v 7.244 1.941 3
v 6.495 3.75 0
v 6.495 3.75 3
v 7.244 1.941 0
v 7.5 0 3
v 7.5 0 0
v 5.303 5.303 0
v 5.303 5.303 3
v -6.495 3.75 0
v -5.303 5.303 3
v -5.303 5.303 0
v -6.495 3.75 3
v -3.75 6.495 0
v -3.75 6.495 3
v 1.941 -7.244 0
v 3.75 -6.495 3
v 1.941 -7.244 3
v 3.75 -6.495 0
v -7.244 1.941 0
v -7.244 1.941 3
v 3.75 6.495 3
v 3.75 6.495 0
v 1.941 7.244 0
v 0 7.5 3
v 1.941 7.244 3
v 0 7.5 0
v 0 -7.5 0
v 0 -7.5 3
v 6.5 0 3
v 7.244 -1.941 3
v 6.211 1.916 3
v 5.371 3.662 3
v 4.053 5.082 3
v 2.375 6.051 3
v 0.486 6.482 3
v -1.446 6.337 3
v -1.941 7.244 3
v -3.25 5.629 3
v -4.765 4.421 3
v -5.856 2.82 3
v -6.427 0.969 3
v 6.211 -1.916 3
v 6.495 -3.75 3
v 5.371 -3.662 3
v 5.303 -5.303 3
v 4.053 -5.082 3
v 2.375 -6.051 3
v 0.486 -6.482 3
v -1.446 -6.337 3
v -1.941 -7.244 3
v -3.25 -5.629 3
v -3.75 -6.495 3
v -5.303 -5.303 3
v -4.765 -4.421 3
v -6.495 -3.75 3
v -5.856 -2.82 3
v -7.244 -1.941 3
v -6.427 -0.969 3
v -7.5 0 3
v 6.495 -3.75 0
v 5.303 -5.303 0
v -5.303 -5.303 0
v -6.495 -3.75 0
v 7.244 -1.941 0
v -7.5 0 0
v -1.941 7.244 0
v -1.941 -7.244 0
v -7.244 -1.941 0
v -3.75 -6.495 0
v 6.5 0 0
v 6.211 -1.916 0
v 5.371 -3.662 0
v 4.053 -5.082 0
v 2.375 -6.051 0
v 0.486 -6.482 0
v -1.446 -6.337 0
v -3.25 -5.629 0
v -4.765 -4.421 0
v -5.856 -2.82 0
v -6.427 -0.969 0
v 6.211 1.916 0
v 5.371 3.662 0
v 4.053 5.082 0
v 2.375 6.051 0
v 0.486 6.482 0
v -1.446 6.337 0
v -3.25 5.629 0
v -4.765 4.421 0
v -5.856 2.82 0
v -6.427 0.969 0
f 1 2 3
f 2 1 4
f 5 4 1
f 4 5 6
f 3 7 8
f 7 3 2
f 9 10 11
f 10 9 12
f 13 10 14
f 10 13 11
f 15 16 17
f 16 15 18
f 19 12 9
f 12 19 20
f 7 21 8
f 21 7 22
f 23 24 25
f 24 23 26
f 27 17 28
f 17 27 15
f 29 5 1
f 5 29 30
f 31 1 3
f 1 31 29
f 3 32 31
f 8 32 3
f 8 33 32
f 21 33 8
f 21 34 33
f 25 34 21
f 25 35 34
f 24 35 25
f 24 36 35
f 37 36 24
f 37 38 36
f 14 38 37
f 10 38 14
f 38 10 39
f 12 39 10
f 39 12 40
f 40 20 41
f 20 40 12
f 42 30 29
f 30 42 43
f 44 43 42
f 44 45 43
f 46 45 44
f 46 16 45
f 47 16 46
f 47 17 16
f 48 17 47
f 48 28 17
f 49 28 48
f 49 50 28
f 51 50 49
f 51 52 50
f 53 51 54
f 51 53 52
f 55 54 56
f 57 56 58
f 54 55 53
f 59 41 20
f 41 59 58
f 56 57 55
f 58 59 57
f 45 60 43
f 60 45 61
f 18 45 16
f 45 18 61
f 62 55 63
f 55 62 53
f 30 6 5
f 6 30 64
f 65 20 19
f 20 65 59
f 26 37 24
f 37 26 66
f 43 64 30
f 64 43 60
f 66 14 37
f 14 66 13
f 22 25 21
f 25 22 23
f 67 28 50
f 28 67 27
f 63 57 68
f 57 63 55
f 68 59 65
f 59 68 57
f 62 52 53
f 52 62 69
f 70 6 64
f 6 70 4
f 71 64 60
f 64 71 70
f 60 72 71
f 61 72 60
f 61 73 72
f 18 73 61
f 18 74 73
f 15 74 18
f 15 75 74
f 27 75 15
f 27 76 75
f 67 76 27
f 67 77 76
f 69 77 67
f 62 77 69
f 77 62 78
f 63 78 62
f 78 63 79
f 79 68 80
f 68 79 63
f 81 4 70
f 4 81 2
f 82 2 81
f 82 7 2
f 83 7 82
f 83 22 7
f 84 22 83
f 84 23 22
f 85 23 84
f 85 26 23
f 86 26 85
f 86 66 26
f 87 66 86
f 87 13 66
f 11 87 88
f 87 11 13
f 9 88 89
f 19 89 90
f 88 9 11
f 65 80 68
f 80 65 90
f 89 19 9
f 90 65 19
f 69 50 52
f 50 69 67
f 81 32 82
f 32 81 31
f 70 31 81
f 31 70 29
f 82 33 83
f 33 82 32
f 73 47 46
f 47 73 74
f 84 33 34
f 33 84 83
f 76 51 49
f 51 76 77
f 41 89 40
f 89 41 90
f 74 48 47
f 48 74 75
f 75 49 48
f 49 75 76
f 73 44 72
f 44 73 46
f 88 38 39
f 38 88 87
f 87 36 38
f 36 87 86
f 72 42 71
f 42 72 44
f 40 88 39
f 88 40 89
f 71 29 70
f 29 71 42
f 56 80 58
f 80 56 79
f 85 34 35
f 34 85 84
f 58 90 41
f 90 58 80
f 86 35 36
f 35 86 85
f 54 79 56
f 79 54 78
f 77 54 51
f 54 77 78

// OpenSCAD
module hollow_cylinder(d, h, w){
  difference(){
    cylinder(d=d, h=h);
    cylinder(d=d-w*2, h=h);
  }
}

hollow_cylinder(d=15, h=3, w=1);
